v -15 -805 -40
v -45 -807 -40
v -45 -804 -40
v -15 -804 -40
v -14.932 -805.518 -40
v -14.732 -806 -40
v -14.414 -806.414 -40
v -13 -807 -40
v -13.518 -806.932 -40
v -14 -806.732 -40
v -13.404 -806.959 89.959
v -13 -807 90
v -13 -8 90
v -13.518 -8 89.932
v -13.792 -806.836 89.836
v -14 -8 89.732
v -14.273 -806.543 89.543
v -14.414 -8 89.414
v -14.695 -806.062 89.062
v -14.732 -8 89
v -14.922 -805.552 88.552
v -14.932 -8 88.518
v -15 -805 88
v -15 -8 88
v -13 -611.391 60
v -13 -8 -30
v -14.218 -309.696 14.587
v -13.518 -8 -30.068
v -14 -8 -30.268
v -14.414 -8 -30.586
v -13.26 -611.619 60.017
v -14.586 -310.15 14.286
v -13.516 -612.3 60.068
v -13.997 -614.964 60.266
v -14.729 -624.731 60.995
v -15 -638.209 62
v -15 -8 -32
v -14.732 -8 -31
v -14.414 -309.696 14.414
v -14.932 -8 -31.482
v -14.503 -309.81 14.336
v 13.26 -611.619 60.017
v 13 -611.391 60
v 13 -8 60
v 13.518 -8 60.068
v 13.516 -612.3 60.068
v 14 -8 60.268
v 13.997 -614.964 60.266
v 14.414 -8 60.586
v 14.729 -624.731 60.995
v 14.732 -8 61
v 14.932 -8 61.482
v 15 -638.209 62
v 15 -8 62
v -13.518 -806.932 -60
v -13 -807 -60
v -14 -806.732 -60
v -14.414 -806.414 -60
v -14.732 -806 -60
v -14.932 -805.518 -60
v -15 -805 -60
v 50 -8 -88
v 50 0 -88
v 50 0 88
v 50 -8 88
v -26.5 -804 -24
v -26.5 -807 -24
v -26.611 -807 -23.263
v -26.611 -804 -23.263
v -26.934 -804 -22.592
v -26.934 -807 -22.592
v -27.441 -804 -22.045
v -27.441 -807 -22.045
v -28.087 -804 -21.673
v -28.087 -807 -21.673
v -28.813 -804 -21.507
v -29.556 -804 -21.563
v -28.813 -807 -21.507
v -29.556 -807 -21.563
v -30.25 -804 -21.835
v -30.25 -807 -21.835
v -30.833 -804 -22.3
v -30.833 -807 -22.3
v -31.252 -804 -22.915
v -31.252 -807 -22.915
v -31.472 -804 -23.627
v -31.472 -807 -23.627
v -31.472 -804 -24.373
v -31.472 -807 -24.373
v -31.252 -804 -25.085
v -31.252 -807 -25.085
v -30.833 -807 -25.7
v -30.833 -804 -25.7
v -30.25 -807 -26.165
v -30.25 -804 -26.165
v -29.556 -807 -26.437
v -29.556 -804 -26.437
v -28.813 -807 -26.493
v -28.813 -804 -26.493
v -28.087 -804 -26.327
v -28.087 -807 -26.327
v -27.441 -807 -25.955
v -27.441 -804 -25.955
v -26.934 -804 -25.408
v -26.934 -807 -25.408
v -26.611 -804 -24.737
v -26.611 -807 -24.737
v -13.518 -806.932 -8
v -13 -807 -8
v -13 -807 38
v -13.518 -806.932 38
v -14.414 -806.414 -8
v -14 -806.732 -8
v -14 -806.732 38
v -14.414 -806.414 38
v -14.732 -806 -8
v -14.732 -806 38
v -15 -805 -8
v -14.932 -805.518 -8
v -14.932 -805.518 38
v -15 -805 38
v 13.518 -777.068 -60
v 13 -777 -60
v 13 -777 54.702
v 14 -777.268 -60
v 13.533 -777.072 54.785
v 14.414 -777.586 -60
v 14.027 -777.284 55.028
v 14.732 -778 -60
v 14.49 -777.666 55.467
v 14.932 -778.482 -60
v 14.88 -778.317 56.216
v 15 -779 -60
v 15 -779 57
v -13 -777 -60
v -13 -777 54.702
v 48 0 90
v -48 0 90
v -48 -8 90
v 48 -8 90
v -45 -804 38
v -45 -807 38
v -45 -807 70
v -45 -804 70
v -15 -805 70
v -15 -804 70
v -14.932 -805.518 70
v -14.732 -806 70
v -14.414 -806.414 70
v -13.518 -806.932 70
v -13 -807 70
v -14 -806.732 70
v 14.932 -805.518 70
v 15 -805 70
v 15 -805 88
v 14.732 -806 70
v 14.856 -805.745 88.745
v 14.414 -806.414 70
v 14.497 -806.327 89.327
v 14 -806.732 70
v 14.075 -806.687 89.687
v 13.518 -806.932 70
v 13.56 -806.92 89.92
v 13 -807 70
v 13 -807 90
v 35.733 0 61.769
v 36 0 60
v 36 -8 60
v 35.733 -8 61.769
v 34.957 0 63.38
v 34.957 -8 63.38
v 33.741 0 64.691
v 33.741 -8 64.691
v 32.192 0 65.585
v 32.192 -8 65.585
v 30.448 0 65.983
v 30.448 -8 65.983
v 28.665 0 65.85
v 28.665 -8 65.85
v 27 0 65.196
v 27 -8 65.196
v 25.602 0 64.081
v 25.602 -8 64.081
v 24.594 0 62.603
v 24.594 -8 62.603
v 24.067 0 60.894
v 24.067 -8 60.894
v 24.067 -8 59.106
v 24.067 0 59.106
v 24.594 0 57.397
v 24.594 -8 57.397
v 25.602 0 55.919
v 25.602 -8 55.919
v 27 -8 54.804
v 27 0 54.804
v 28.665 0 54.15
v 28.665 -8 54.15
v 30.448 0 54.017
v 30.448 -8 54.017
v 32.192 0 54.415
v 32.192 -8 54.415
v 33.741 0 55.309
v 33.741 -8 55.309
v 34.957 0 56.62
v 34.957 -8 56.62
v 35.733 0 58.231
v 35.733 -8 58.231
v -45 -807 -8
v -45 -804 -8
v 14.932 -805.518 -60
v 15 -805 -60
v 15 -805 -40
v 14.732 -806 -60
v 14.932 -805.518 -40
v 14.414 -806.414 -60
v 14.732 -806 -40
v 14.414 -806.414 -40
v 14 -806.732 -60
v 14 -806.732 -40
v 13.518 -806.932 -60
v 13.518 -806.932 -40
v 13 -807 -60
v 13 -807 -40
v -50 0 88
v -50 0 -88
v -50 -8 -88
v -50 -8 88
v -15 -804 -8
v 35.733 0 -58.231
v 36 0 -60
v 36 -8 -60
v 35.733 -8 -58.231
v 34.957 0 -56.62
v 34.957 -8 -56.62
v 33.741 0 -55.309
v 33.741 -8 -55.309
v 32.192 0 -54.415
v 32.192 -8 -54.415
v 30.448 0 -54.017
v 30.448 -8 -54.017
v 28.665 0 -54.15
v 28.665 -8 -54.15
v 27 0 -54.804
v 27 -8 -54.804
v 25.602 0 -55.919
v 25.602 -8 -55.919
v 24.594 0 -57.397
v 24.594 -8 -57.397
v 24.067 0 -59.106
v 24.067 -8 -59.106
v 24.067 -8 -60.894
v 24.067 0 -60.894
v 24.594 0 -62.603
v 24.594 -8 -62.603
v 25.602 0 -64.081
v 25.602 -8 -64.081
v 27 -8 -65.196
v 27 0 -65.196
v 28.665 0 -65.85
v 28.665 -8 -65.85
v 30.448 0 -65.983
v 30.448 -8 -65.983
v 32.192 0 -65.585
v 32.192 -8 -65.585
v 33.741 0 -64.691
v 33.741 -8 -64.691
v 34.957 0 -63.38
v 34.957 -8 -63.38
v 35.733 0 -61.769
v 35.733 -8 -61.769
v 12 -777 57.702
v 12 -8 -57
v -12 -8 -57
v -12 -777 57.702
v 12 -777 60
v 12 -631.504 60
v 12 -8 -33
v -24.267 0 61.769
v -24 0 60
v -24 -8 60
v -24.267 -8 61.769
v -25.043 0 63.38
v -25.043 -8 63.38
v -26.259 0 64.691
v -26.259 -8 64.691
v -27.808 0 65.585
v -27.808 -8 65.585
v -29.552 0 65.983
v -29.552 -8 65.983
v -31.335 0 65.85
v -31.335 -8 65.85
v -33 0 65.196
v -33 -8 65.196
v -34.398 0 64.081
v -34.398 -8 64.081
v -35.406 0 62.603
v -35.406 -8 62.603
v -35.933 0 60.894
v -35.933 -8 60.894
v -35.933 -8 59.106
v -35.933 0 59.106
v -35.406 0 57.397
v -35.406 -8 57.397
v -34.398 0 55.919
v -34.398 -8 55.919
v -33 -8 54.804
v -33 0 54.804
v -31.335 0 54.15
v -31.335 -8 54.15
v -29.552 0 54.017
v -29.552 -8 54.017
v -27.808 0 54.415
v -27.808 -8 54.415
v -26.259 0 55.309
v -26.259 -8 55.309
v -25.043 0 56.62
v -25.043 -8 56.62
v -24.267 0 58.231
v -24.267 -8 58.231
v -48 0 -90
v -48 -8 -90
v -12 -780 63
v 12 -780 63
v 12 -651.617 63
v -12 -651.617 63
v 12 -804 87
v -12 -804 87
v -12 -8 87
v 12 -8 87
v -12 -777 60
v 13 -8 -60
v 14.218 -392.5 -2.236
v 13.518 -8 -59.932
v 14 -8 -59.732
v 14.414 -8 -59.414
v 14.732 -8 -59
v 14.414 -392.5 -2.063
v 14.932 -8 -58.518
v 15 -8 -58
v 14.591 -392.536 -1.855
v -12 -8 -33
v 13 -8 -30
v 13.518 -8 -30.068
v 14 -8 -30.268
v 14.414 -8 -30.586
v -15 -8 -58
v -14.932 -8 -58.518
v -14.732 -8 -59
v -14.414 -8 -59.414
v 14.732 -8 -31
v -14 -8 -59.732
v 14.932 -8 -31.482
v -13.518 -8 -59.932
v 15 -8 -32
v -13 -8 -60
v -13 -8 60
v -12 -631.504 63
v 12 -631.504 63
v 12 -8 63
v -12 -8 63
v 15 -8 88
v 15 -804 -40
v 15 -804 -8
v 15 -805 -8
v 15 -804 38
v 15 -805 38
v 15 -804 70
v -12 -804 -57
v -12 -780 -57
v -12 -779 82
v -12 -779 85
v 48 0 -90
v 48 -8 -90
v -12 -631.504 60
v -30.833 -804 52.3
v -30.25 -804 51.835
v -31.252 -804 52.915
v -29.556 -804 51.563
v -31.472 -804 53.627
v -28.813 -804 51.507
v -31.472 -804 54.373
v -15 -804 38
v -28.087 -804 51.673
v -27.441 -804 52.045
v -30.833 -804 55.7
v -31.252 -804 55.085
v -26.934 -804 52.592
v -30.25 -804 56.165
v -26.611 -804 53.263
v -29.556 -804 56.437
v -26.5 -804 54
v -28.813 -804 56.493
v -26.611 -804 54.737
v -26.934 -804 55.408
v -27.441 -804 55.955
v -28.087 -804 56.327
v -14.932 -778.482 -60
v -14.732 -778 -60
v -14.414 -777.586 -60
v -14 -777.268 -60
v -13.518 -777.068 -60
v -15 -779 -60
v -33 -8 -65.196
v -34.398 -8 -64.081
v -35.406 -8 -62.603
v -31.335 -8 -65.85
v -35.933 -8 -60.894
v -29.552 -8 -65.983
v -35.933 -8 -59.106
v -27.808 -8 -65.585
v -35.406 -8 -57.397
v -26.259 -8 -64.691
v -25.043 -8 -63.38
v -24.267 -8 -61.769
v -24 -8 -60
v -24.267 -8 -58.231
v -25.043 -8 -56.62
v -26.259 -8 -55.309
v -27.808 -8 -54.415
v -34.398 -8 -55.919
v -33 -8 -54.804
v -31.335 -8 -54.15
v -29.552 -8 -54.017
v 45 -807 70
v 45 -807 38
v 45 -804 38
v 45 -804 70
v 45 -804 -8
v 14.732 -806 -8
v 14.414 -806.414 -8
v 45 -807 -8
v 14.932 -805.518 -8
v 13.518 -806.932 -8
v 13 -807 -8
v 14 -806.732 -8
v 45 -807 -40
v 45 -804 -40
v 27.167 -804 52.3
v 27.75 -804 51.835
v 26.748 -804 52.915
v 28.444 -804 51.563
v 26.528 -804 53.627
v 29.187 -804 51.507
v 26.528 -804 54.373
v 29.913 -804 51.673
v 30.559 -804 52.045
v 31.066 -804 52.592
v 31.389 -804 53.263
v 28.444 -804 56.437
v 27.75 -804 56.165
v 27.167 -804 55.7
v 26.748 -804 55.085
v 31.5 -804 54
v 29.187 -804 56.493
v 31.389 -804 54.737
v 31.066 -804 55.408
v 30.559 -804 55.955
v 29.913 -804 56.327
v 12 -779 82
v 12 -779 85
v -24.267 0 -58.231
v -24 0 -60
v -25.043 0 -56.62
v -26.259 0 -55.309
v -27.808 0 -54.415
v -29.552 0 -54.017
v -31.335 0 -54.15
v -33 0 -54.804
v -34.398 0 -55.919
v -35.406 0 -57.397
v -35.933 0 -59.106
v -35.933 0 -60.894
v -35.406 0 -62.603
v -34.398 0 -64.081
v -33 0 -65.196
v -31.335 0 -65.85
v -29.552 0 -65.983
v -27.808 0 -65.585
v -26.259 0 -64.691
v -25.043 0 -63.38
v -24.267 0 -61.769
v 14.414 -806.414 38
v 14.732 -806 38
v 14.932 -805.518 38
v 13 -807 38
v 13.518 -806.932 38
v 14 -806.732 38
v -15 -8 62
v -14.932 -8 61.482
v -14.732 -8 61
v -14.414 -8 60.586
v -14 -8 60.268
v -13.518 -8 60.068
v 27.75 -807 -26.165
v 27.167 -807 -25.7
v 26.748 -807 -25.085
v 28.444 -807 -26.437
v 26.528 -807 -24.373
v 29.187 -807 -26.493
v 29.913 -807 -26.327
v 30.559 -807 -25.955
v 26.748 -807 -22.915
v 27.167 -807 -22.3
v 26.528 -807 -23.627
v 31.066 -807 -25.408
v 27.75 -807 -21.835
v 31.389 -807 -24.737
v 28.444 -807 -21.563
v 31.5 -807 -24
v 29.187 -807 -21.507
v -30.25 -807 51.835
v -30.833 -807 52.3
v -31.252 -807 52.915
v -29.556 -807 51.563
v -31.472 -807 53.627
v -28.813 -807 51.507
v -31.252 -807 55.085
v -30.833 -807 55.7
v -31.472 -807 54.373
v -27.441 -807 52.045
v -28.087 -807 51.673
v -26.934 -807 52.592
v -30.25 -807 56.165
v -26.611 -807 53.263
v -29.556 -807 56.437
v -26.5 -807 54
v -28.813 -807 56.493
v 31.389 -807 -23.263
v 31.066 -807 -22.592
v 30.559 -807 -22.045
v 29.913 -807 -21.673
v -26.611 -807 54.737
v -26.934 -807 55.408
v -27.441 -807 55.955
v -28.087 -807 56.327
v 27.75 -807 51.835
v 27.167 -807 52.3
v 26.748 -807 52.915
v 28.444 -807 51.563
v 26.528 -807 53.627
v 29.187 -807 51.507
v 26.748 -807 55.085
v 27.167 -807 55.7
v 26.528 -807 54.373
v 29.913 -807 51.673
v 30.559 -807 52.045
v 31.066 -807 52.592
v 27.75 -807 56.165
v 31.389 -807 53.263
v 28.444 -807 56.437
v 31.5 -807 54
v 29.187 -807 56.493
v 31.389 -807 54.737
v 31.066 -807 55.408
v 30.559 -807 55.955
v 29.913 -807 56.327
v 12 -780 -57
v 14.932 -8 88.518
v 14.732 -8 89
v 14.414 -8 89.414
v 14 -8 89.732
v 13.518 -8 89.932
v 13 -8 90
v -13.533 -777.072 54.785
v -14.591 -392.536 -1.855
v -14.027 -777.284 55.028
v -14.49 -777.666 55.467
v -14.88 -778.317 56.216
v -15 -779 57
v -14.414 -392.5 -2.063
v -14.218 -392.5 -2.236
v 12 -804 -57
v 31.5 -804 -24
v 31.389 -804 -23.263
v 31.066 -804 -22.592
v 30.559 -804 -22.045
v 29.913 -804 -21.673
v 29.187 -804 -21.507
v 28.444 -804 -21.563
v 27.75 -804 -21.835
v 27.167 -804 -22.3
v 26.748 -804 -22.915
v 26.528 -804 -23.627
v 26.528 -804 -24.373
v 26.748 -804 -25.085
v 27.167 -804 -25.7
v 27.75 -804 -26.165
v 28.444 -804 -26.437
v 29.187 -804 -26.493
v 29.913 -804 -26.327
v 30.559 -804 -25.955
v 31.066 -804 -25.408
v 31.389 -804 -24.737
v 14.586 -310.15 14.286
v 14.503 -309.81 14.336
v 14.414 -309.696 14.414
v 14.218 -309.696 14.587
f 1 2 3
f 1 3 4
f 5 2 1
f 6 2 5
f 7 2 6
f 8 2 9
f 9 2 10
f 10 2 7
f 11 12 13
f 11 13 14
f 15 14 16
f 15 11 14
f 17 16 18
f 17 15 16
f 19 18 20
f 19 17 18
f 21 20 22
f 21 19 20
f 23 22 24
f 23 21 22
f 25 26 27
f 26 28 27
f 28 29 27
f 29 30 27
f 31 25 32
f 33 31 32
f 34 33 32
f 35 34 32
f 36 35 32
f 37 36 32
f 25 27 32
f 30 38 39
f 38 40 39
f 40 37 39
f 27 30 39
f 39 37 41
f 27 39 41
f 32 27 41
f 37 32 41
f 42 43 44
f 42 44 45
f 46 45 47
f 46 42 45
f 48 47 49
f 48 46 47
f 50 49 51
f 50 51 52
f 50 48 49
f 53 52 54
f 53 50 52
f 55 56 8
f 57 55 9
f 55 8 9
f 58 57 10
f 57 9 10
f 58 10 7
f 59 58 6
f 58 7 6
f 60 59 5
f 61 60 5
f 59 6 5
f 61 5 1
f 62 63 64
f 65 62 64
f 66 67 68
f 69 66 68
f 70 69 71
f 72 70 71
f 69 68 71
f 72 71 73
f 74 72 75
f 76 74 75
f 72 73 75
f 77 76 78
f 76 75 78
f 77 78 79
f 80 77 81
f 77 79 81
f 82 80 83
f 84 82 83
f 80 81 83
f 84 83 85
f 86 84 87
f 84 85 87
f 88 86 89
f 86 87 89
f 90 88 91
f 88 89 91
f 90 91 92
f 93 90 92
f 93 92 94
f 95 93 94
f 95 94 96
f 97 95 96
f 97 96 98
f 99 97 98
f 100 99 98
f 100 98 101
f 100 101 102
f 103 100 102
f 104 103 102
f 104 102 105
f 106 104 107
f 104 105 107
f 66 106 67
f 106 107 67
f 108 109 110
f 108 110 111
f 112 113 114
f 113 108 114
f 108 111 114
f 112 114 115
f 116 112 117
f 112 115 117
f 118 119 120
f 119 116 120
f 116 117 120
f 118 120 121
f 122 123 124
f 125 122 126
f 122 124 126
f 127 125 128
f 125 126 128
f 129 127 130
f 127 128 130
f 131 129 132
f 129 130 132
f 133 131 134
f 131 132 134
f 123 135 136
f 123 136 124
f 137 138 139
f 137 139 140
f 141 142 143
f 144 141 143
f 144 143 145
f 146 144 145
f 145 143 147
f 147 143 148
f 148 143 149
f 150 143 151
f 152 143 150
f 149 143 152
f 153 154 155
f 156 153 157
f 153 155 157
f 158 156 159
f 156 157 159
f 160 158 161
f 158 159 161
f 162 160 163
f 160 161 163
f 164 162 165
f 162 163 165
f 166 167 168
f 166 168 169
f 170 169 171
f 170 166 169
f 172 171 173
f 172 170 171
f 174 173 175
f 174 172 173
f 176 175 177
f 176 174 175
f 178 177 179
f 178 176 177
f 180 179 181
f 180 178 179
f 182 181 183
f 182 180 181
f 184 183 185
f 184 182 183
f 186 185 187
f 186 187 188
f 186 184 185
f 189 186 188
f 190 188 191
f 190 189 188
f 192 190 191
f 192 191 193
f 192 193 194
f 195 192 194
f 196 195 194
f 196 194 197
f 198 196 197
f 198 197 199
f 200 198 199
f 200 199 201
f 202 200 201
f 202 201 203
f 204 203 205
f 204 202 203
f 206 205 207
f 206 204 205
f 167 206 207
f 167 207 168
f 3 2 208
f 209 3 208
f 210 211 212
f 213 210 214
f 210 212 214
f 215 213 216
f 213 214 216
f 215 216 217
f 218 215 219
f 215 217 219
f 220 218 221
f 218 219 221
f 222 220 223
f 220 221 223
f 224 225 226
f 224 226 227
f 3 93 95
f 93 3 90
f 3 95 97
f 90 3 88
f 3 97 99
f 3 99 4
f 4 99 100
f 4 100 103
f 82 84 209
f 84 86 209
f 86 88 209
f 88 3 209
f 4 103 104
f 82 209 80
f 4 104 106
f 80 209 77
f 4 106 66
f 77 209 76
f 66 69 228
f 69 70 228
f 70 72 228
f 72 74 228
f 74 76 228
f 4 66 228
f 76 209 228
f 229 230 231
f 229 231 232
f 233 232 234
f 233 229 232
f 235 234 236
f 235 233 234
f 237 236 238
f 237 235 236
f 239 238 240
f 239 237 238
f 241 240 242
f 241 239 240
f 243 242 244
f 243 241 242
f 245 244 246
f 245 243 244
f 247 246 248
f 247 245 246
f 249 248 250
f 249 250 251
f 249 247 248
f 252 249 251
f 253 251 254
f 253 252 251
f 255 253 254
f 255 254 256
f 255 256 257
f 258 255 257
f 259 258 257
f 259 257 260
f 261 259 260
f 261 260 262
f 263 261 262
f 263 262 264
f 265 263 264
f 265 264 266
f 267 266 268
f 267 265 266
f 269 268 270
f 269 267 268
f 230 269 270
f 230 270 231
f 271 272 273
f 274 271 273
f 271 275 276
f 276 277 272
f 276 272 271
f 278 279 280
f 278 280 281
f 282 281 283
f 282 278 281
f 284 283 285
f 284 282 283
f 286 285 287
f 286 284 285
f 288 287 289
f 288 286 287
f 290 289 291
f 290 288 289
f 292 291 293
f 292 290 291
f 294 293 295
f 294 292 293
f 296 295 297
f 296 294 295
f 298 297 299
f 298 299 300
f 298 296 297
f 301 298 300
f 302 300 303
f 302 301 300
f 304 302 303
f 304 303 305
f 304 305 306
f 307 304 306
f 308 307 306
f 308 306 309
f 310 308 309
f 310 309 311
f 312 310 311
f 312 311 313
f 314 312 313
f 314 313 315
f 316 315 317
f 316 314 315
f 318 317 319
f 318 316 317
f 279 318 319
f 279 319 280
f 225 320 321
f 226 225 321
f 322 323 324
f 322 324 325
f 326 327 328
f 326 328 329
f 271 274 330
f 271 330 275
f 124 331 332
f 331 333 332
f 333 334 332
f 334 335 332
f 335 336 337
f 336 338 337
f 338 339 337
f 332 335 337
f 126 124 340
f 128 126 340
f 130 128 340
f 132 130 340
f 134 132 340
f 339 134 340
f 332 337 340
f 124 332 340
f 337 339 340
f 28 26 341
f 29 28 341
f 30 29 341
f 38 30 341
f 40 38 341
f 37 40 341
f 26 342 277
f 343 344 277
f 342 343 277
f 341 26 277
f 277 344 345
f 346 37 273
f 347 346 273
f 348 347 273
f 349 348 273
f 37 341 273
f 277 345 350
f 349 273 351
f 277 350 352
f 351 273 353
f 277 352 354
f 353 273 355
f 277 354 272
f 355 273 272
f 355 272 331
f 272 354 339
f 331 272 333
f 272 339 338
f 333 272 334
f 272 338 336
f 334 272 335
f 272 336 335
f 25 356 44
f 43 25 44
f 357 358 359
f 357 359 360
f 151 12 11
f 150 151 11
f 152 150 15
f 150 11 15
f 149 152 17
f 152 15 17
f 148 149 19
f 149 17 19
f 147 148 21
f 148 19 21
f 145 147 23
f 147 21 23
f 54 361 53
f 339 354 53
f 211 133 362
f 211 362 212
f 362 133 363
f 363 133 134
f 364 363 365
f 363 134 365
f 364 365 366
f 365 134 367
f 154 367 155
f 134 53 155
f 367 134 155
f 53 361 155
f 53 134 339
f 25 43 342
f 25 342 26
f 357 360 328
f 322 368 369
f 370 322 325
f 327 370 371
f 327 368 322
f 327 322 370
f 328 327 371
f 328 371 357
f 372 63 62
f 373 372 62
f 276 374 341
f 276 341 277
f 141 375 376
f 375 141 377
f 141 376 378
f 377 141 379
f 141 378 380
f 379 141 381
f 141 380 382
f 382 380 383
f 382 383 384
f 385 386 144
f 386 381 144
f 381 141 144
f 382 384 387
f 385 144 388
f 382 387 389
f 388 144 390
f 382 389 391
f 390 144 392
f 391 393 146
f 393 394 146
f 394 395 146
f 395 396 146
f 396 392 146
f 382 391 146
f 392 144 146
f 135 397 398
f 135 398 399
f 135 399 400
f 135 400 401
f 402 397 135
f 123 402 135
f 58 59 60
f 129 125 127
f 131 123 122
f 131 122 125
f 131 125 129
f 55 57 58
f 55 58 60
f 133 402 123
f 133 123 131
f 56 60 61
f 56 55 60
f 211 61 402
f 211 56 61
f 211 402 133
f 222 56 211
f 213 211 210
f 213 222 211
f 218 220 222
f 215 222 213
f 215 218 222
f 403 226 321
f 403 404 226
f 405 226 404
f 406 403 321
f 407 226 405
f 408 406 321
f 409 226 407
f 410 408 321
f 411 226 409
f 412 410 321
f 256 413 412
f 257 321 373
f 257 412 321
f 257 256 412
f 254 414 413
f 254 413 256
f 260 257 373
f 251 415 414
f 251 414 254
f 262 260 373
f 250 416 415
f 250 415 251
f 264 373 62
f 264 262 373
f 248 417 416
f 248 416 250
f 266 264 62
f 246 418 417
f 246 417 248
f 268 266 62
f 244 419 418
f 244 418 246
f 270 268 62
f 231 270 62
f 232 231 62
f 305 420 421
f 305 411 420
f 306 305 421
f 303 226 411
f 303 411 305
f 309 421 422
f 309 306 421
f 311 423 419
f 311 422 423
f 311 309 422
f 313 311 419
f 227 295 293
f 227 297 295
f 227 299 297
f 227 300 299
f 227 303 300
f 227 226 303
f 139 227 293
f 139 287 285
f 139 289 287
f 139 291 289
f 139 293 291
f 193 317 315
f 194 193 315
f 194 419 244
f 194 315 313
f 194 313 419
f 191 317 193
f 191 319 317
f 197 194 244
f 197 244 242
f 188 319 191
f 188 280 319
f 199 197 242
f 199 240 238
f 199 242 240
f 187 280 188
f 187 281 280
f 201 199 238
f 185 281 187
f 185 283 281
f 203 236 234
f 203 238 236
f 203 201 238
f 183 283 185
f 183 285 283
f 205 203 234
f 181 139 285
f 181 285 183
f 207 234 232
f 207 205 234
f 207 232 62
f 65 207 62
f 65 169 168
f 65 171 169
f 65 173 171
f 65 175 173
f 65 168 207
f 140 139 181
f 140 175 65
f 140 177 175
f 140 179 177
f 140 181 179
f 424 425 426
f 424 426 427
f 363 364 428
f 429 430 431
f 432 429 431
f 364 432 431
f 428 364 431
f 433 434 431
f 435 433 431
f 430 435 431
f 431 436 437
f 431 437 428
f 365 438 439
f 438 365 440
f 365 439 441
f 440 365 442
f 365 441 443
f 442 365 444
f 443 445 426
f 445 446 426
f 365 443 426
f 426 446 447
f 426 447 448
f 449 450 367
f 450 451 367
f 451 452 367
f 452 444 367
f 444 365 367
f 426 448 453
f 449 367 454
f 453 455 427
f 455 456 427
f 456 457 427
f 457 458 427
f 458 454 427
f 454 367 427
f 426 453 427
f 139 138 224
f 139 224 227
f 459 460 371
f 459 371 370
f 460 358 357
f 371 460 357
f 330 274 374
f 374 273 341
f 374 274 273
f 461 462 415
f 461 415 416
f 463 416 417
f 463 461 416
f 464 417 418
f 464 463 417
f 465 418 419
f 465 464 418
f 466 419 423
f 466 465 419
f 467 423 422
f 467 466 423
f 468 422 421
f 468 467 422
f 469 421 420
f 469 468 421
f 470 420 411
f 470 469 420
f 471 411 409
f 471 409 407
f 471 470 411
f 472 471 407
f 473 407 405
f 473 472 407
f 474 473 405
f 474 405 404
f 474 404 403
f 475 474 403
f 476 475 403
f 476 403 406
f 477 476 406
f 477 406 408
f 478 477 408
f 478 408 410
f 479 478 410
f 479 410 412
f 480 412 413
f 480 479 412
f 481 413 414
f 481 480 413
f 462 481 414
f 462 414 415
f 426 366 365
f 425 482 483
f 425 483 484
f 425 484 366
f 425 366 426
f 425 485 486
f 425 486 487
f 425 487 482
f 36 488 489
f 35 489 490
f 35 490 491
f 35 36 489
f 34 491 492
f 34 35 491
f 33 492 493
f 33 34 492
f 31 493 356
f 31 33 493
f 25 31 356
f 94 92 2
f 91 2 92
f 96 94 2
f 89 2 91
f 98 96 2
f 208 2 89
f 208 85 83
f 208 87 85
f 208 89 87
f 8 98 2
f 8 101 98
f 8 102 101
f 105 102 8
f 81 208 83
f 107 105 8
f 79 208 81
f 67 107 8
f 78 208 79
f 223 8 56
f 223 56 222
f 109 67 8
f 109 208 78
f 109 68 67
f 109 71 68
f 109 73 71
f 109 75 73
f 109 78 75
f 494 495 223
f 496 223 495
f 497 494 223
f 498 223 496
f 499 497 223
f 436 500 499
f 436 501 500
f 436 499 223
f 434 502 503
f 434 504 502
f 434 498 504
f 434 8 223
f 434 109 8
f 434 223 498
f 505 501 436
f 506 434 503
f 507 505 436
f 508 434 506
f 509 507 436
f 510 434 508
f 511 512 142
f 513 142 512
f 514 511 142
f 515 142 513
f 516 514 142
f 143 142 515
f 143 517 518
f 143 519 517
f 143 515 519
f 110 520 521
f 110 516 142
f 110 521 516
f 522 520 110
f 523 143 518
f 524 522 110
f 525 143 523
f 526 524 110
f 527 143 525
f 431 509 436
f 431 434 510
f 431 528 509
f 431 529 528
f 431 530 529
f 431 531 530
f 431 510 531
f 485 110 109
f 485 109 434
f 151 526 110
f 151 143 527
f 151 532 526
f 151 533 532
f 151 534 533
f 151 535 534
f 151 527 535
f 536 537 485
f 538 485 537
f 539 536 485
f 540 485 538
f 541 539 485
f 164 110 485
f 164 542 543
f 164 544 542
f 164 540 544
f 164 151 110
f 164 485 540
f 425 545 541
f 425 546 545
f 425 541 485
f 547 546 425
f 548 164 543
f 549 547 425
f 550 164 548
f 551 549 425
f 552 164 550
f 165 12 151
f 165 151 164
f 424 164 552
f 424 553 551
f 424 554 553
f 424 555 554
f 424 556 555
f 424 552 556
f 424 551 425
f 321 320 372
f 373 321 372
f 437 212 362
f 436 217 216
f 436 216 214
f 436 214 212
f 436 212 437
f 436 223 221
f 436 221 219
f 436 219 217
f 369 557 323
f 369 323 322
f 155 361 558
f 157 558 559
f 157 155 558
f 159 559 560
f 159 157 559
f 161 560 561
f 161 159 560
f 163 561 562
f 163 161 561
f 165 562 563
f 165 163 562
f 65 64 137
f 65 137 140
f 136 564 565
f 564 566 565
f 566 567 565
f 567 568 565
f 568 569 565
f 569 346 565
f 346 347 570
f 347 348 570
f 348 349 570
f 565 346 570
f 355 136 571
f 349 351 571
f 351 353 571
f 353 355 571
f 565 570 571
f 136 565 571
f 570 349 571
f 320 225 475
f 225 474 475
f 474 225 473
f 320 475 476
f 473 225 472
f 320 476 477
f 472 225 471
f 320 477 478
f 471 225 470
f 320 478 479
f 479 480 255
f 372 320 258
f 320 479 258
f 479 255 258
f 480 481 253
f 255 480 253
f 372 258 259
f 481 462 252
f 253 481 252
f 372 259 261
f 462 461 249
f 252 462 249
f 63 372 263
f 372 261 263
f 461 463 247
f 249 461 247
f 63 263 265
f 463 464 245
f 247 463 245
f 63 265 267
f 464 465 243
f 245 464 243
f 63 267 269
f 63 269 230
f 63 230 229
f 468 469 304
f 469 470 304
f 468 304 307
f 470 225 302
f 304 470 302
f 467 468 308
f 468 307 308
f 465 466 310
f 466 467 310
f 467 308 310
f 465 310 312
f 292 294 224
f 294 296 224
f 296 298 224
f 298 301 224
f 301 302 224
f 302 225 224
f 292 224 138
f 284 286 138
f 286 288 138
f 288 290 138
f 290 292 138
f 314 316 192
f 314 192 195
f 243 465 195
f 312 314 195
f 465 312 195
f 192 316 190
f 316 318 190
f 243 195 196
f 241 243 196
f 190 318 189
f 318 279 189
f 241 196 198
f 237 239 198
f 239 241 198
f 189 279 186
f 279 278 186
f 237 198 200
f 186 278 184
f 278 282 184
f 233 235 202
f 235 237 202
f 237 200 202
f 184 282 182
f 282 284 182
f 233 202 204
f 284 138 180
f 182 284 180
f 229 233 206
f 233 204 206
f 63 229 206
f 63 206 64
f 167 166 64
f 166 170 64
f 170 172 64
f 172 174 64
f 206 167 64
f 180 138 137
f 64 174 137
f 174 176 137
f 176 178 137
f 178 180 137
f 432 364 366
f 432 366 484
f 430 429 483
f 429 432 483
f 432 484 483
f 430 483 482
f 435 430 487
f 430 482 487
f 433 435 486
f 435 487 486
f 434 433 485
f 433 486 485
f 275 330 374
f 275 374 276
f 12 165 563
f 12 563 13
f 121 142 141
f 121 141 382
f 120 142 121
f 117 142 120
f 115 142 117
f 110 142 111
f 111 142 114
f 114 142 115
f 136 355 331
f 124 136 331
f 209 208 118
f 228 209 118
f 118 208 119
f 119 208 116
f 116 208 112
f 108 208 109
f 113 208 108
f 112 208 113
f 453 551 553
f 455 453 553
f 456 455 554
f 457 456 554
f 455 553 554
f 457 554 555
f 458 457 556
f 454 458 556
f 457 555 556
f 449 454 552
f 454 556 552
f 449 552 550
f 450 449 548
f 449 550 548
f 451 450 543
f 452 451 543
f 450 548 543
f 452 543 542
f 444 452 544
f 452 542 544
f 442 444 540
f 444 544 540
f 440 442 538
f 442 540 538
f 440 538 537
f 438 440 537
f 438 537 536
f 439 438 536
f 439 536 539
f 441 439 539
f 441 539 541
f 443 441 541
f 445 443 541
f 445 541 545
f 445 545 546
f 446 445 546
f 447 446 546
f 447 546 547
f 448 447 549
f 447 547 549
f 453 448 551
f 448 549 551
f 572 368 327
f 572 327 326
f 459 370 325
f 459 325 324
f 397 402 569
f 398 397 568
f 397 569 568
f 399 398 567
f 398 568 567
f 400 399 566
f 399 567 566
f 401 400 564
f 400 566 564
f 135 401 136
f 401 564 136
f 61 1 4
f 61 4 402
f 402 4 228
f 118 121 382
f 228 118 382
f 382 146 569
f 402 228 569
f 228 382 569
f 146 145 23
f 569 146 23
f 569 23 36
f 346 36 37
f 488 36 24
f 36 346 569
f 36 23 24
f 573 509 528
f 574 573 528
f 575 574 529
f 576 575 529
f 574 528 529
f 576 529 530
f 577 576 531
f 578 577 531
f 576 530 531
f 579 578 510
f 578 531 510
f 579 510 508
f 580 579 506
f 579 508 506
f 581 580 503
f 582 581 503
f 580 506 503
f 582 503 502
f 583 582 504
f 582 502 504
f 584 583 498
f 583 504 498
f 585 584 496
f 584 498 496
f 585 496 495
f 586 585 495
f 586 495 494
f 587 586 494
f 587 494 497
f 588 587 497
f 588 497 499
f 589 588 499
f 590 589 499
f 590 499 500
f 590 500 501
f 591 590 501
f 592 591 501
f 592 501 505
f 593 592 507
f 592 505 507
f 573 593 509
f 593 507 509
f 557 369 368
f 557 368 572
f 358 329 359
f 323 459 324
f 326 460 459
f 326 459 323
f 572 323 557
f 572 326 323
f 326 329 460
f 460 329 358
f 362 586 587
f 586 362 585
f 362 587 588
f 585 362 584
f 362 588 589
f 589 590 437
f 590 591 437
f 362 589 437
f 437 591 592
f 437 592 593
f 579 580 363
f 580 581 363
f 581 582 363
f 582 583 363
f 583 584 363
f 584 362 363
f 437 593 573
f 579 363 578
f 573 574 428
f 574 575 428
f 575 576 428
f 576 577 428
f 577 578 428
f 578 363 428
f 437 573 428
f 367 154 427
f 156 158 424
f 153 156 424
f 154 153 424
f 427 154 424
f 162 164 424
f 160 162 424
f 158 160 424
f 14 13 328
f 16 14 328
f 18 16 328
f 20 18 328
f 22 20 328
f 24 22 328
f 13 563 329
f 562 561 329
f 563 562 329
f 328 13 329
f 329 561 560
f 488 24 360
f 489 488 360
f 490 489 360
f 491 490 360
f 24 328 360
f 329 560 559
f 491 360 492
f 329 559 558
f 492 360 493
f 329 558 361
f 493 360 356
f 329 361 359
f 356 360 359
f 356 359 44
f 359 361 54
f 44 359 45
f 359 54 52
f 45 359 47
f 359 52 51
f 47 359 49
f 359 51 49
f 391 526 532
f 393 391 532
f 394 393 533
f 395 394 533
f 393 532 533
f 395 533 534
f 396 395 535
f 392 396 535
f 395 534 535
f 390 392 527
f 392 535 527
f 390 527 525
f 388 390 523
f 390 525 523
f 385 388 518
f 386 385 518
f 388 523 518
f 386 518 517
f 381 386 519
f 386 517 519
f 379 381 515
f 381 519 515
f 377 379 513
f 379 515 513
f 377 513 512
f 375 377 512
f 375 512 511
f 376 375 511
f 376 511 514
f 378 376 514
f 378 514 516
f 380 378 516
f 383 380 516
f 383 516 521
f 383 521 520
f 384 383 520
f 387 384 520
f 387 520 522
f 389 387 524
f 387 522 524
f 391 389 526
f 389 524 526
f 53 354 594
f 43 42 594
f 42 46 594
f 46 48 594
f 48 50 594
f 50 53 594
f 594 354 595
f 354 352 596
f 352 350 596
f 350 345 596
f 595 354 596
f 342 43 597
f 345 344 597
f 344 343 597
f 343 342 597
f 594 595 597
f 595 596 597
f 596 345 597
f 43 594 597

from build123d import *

# Parameters (mm, degrees)
F0_W      = 100
F0_H      = 180
F0_R      = 6
F1_DEPTH  = 8
F2_SIZE   = 2
F4_W      = 24
F4_H      = 24
F8_DEPTH  = 3
F9_W      = 32
F9_H      = 32
F9_R      = 2.5
F10_DEPTH = 3


with BuildPart() as f1:
    # F0 (on Front) → F1 (new body)
    with BuildSketch(Plane.XZ):
        Rectangle(F0_W, F0_H)
        with Locations((-30, -60)):
            Circle(F0_R, mode=Mode.SUBTRACT)
        with Locations((30, -60)):
            Circle(F0_R, mode=Mode.SUBTRACT)
        with Locations((-30, 60)):
            Circle(F0_R, mode=Mode.SUBTRACT)
        with Locations((30, 60)):
            Circle(F0_R, mode=Mode.SUBTRACT)
    extrude(amount=F1_DEPTH)

    # F2
    f2_edges = [f1.edges().sort_by_distance(p)[0] for p in [
        (50, -4, 90),
        (50, -4, -90),
        (-50, -4, -90),
        (-50, -4, 90),
    ]]
    chamfer(f2_edges, length=F2_SIZE)


with BuildPart() as f5:
    # F5: sweep along a path in F3
    with BuildLine(Plane.YZ) as f5_path:
        Line((-8, 90), (-807, 90))
        Line((-807, 90), (-807, -57))
    # F4 (on face) → F5 (sweep)
    with BuildSketch(Plane.XZ.offset(8)):
        with BuildLine():
            Line((13, 90), (-13, 90))
            ThreePointArc((-13, 90), (-14.4142135624, 89.4142135624), (-15, 88))
            Line((-15, 88), (-15, 62))
            ThreePointArc((-15, 62), (-14.4142135624, 60.5857864376), (-13, 60))
            Line((-13, 60), (13, 60))
            ThreePointArc((13, 60), (14.4142135624, 60.5857864376), (15, 62))
            Line((15, 62), (15, 88))
            ThreePointArc((15, 88), (14.4142135624, 89.4142135624), (13, 90))
        make_face()
        with Locations((0, 75)):
            Rectangle(F4_W, F4_H, mode=Mode.SUBTRACT)
    sweep(path=f5_path.line, transition=Transition.RIGHT)

    # F6: sweep along a path in F3
    with BuildLine(Plane.YZ) as f6_path:
        Line((-779, 55), (-8, -60))
    # F4 (on face) → F6 (sweep)
    with BuildSketch(Plane.XZ.offset(8)):
        with BuildLine():
            Line((13, -30), (-13, -30))
            ThreePointArc((-13, -30), (-14.4142135624, -30.5857864376), (-15, -32))
            Line((-15, -32), (-15, -58))
            ThreePointArc((-15, -58), (-14.4142135624, -59.4142135624), (-13, -60))
            Line((-13, -60), (13, -60))
            ThreePointArc((13, -60), (14.4142135624, -59.4142135624), (15, -58))
            Line((15, -58), (15, -32))
            ThreePointArc((15, -32), (14.4142135624, -30.5857864376), (13, -30))
        make_face()
        with Locations((0, -45)):
            Rectangle(F4_W, F4_H, mode=Mode.SUBTRACT)
    sweep(path=f6_path.line)

    # F7 (on face) → F8 (join)
    with BuildSketch(Plane(origin=(0, 0, -57), x_dir=(1, 0, 0), z_dir=(0, 0, -1))):
        with BuildLine():
            ThreePointArc((-13, 807), (-14.4142135624, 806.4142135624), (-15, 805))
            Line((-15, 805), (-15, 779))
            ThreePointArc((-15, 779), (-14.4142135624, 777.5857864376), (-13, 777))
            Line((-13, 777), (13, 777))
            ThreePointArc((13, 777), (14.4142135624, 777.5857864376), (15, 779))
            Line((15, 779), (15, 805))
            ThreePointArc((15, 805), (14.4142135624, 806.4142135624), (13, 807))
            Line((13, 807), (-13, 807))
        make_face()
    extrude(amount=F8_DEPTH)

    # F9 (on face) → F10 (join)
    with BuildSketch(Plane.XZ.offset(807)):
        with Locations((29, 54)):
            Rectangle(F9_W, F9_H)
        with Locations((29, 54)):
            Circle(F9_R, mode=Mode.SUBTRACT)
        with Locations((29, -24)):
            Rectangle(F9_W, F9_H)
        with Locations((29, -24)):
            Circle(F9_R, mode=Mode.SUBTRACT)
        with Locations((-29, 54)):
            Rectangle(F9_W, F9_H)
        with Locations((-29, 54)):
            Circle(F9_R, mode=Mode.SUBTRACT)
        with Locations((-29, -24)):
            Rectangle(F9_W, F9_H)
        with Locations((-29, -24)):
            Circle(F9_R, mode=Mode.SUBTRACT)
    extrude(amount=-F10_DEPTH)


solid = Compound([f1.part, f5.part])
